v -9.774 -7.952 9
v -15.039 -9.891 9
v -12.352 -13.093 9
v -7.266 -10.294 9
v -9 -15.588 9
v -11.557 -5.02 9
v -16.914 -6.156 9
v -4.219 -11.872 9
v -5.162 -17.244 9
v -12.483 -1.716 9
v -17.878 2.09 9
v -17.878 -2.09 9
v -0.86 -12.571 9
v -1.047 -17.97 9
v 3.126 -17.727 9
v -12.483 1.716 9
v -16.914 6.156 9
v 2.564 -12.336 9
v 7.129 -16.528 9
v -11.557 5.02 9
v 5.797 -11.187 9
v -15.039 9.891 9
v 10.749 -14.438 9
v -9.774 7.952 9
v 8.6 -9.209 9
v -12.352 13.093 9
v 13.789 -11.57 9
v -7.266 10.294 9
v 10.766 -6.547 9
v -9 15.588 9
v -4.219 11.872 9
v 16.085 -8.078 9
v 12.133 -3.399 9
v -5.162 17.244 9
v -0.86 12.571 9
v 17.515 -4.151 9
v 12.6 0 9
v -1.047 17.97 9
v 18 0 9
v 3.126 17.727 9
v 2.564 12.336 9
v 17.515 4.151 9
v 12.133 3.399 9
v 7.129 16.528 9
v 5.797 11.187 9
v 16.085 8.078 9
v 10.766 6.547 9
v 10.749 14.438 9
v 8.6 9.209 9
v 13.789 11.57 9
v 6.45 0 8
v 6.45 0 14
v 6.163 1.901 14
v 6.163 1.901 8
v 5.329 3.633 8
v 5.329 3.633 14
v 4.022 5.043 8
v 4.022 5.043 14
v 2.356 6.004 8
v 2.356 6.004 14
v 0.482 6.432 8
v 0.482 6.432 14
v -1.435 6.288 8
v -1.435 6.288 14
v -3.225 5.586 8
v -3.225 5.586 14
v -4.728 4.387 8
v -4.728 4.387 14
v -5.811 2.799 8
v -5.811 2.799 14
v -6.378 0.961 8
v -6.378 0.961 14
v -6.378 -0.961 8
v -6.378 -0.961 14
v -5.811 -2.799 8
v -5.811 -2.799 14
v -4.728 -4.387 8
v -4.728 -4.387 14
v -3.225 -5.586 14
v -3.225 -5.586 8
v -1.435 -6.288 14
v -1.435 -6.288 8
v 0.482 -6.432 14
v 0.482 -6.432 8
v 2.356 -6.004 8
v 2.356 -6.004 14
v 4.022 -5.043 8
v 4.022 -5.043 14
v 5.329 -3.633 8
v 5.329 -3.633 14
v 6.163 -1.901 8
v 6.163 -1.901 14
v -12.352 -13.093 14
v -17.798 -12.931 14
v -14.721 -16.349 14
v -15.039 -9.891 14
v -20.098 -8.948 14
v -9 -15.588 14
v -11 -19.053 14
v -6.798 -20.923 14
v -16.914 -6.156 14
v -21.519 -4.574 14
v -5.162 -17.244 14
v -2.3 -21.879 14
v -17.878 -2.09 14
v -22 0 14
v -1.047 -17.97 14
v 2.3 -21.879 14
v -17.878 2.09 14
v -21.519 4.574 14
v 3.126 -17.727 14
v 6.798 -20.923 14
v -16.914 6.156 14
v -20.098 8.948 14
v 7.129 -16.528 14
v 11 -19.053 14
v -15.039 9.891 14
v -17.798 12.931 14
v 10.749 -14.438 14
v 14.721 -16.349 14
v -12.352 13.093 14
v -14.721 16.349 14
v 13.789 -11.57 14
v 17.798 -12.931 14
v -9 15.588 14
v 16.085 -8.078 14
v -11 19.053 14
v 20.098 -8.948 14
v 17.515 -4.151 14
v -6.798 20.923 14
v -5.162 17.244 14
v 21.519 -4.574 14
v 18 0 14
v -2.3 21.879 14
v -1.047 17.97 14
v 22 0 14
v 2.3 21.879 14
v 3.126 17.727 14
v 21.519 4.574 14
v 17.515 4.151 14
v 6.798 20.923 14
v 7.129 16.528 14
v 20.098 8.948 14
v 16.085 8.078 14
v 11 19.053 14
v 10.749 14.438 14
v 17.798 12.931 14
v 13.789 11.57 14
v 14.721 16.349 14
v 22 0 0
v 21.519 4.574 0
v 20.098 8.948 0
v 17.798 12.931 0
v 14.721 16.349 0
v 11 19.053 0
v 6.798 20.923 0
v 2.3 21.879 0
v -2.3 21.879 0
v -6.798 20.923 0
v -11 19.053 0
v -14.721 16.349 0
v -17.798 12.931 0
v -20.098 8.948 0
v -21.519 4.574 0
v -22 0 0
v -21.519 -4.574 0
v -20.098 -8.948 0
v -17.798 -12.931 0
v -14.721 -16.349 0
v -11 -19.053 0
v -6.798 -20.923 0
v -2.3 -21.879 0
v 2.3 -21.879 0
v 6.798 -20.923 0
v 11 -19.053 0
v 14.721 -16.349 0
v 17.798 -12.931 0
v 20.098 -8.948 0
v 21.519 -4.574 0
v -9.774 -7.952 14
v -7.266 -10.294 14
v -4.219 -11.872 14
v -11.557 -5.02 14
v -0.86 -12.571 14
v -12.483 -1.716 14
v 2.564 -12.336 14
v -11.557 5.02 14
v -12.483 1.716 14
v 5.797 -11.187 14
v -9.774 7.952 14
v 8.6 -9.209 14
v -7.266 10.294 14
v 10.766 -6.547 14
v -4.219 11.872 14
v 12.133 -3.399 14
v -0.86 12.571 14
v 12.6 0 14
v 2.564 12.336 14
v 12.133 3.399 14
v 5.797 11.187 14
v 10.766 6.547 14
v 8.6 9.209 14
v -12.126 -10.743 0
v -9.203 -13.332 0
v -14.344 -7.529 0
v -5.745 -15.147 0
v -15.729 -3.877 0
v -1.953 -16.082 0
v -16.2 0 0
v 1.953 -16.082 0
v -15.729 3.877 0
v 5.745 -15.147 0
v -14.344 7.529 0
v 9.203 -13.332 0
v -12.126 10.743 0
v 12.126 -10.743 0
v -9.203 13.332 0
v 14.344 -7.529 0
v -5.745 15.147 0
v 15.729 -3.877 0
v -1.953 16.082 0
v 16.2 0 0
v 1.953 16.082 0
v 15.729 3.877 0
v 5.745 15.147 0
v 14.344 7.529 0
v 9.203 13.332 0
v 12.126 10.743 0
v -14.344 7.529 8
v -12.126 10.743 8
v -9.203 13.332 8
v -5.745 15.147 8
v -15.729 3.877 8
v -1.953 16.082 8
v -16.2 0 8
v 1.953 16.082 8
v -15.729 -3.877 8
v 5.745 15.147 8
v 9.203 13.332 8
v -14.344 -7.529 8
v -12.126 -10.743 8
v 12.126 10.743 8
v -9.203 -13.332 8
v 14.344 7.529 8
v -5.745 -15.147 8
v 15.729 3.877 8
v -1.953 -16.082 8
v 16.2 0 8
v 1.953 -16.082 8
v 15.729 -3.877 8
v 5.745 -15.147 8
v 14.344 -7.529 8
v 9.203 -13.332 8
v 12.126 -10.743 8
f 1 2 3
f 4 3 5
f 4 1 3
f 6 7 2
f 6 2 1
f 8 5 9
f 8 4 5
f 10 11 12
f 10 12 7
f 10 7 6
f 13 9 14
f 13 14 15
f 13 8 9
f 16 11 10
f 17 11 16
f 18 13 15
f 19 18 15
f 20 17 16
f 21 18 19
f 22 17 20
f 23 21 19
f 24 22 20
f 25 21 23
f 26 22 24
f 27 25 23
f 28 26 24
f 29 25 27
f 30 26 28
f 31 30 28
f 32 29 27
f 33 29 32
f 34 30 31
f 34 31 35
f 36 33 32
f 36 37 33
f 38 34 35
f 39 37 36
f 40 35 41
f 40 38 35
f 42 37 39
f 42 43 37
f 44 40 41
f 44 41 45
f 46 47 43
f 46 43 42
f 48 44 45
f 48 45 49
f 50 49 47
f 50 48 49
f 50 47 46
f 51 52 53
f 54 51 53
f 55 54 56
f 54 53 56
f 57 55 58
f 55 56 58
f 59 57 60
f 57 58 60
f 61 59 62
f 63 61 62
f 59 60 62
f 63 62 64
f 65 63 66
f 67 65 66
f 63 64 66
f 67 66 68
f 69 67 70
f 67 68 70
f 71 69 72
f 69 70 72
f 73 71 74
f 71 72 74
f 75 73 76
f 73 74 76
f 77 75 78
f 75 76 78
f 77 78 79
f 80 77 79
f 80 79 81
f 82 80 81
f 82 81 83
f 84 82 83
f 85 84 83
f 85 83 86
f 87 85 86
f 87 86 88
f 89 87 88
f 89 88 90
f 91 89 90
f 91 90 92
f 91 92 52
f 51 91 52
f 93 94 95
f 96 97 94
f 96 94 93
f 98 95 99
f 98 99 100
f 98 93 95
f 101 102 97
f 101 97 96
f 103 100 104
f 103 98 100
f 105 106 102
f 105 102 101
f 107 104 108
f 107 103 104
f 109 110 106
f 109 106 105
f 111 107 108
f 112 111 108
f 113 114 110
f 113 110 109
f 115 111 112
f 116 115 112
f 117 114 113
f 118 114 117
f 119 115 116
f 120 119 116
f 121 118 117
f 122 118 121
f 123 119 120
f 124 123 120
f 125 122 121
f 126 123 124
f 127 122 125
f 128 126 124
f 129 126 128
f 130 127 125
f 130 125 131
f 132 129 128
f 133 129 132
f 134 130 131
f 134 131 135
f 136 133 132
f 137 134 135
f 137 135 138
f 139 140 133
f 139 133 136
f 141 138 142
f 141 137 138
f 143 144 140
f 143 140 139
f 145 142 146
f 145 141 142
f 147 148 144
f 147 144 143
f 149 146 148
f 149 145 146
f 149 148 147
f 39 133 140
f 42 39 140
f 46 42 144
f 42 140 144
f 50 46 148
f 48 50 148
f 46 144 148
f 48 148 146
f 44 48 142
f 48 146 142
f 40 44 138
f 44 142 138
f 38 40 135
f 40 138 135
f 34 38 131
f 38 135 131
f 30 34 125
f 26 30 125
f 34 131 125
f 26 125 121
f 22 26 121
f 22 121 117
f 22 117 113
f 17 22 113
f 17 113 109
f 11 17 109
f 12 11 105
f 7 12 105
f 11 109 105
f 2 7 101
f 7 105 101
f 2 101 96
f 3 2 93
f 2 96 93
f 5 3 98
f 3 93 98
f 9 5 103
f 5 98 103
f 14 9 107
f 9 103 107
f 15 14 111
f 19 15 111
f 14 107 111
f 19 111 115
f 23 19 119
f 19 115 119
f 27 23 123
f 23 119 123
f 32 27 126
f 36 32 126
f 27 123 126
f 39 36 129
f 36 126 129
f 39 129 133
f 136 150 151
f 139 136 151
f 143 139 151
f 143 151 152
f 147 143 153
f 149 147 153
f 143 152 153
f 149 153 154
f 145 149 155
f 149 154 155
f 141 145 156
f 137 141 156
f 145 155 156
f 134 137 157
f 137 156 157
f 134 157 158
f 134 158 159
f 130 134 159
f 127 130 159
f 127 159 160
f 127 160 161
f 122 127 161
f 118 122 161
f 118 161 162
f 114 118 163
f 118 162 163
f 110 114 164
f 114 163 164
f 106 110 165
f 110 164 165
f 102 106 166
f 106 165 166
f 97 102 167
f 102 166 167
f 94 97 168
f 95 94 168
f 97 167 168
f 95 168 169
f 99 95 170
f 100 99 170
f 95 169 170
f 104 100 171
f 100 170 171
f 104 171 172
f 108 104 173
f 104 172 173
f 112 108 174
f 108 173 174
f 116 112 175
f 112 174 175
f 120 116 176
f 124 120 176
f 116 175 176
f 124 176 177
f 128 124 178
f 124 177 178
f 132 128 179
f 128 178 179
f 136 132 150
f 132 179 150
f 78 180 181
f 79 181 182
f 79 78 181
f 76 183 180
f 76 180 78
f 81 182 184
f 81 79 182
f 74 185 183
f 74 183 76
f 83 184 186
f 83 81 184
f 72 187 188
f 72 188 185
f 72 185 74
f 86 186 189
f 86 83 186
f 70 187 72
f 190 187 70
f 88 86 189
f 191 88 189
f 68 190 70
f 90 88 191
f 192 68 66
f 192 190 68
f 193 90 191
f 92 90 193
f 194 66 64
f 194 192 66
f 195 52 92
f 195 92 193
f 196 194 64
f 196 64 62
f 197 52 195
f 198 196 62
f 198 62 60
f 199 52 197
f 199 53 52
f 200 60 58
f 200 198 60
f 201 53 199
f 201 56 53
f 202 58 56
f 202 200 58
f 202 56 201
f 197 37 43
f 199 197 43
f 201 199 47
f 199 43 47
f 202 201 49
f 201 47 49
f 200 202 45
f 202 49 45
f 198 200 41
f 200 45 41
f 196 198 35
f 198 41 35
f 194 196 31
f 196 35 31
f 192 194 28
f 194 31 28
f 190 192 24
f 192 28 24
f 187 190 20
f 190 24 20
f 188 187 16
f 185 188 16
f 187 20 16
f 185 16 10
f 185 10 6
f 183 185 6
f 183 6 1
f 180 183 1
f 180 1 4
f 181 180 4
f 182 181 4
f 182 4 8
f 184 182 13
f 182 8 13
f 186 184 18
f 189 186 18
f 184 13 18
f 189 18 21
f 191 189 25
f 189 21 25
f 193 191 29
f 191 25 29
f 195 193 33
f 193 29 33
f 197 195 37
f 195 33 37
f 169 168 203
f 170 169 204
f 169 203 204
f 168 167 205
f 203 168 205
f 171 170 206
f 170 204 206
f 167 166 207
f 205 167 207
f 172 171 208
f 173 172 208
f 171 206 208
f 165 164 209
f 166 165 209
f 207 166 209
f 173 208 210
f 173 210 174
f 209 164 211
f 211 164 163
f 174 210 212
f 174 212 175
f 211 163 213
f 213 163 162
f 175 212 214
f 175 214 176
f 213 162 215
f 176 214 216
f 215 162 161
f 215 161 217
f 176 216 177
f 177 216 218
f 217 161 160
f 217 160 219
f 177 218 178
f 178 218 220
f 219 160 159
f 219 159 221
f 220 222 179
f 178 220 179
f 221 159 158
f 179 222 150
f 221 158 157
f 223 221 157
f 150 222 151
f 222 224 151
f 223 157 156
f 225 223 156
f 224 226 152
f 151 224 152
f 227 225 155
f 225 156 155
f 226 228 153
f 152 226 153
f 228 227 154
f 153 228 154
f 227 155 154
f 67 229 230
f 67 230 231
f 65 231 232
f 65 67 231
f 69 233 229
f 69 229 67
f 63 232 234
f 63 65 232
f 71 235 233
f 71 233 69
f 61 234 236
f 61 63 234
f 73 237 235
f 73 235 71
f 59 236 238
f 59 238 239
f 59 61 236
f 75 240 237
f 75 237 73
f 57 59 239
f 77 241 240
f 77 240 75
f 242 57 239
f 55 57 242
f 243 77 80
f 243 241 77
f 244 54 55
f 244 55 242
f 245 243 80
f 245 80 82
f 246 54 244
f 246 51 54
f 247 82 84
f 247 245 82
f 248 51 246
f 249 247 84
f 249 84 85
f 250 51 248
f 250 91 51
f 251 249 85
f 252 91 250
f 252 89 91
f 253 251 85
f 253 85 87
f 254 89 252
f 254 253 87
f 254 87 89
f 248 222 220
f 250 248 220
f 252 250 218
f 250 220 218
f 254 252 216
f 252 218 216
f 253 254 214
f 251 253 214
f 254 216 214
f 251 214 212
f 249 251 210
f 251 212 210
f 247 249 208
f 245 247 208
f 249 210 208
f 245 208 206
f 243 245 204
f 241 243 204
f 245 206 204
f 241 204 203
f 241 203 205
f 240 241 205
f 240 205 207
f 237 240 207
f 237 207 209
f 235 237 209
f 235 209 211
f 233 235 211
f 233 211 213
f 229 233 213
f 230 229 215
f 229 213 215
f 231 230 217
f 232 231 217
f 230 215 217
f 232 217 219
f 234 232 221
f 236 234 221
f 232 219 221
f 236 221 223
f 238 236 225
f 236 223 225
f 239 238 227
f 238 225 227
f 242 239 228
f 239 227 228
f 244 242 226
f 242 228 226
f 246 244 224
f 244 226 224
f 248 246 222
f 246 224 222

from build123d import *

# Parameters (mm, degrees)
SKETCH_R        = 22
PAD_DEPTH       = 14
SKETCH001_R     = 18
POCKET_DEPTH    = 5
SKETCH002_R     = 12.6
PAD001_DEPTH    = 5
SKETCH003_R     = 6.45
POCKET001_DEPTH = 14.001
SKETCH004_R     = 16.2
POCKET002_DEPTH = 8


with BuildPart() as part:
    # Sketch → Pad (new body)
    with BuildSketch(Plane.XY):
        Circle(SKETCH_R)
    extrude(amount=PAD_DEPTH)

    # Sketch001 → Pocket (cut)
    with BuildSketch(Plane.XY.offset(14)):
        Circle(SKETCH001_R)
    extrude(amount=-POCKET_DEPTH, mode=Mode.SUBTRACT)

    # Sketch002 → Pad001 (new body)
    with BuildSketch(Plane.XY.offset(9)):
        Circle(SKETCH002_R)
    extrude(amount=PAD001_DEPTH)

    # Sketch003 → Pocket001 (cut, through all)
    with BuildSketch(Plane.XY.offset(14)):
        Circle(SKETCH003_R)
    extrude(amount=-POCKET001_DEPTH, mode=Mode.SUBTRACT)

    # Sketch004 → Pocket002 (cut)
    with BuildSketch(Plane(origin=(0, 0, 0), x_dir=(1, 0, 0), z_dir=(0, 0, -1))):
        Circle(SKETCH004_R)
    extrude(amount=-POCKET002_DEPTH, mode=Mode.SUBTRACT)


solid = part.part
